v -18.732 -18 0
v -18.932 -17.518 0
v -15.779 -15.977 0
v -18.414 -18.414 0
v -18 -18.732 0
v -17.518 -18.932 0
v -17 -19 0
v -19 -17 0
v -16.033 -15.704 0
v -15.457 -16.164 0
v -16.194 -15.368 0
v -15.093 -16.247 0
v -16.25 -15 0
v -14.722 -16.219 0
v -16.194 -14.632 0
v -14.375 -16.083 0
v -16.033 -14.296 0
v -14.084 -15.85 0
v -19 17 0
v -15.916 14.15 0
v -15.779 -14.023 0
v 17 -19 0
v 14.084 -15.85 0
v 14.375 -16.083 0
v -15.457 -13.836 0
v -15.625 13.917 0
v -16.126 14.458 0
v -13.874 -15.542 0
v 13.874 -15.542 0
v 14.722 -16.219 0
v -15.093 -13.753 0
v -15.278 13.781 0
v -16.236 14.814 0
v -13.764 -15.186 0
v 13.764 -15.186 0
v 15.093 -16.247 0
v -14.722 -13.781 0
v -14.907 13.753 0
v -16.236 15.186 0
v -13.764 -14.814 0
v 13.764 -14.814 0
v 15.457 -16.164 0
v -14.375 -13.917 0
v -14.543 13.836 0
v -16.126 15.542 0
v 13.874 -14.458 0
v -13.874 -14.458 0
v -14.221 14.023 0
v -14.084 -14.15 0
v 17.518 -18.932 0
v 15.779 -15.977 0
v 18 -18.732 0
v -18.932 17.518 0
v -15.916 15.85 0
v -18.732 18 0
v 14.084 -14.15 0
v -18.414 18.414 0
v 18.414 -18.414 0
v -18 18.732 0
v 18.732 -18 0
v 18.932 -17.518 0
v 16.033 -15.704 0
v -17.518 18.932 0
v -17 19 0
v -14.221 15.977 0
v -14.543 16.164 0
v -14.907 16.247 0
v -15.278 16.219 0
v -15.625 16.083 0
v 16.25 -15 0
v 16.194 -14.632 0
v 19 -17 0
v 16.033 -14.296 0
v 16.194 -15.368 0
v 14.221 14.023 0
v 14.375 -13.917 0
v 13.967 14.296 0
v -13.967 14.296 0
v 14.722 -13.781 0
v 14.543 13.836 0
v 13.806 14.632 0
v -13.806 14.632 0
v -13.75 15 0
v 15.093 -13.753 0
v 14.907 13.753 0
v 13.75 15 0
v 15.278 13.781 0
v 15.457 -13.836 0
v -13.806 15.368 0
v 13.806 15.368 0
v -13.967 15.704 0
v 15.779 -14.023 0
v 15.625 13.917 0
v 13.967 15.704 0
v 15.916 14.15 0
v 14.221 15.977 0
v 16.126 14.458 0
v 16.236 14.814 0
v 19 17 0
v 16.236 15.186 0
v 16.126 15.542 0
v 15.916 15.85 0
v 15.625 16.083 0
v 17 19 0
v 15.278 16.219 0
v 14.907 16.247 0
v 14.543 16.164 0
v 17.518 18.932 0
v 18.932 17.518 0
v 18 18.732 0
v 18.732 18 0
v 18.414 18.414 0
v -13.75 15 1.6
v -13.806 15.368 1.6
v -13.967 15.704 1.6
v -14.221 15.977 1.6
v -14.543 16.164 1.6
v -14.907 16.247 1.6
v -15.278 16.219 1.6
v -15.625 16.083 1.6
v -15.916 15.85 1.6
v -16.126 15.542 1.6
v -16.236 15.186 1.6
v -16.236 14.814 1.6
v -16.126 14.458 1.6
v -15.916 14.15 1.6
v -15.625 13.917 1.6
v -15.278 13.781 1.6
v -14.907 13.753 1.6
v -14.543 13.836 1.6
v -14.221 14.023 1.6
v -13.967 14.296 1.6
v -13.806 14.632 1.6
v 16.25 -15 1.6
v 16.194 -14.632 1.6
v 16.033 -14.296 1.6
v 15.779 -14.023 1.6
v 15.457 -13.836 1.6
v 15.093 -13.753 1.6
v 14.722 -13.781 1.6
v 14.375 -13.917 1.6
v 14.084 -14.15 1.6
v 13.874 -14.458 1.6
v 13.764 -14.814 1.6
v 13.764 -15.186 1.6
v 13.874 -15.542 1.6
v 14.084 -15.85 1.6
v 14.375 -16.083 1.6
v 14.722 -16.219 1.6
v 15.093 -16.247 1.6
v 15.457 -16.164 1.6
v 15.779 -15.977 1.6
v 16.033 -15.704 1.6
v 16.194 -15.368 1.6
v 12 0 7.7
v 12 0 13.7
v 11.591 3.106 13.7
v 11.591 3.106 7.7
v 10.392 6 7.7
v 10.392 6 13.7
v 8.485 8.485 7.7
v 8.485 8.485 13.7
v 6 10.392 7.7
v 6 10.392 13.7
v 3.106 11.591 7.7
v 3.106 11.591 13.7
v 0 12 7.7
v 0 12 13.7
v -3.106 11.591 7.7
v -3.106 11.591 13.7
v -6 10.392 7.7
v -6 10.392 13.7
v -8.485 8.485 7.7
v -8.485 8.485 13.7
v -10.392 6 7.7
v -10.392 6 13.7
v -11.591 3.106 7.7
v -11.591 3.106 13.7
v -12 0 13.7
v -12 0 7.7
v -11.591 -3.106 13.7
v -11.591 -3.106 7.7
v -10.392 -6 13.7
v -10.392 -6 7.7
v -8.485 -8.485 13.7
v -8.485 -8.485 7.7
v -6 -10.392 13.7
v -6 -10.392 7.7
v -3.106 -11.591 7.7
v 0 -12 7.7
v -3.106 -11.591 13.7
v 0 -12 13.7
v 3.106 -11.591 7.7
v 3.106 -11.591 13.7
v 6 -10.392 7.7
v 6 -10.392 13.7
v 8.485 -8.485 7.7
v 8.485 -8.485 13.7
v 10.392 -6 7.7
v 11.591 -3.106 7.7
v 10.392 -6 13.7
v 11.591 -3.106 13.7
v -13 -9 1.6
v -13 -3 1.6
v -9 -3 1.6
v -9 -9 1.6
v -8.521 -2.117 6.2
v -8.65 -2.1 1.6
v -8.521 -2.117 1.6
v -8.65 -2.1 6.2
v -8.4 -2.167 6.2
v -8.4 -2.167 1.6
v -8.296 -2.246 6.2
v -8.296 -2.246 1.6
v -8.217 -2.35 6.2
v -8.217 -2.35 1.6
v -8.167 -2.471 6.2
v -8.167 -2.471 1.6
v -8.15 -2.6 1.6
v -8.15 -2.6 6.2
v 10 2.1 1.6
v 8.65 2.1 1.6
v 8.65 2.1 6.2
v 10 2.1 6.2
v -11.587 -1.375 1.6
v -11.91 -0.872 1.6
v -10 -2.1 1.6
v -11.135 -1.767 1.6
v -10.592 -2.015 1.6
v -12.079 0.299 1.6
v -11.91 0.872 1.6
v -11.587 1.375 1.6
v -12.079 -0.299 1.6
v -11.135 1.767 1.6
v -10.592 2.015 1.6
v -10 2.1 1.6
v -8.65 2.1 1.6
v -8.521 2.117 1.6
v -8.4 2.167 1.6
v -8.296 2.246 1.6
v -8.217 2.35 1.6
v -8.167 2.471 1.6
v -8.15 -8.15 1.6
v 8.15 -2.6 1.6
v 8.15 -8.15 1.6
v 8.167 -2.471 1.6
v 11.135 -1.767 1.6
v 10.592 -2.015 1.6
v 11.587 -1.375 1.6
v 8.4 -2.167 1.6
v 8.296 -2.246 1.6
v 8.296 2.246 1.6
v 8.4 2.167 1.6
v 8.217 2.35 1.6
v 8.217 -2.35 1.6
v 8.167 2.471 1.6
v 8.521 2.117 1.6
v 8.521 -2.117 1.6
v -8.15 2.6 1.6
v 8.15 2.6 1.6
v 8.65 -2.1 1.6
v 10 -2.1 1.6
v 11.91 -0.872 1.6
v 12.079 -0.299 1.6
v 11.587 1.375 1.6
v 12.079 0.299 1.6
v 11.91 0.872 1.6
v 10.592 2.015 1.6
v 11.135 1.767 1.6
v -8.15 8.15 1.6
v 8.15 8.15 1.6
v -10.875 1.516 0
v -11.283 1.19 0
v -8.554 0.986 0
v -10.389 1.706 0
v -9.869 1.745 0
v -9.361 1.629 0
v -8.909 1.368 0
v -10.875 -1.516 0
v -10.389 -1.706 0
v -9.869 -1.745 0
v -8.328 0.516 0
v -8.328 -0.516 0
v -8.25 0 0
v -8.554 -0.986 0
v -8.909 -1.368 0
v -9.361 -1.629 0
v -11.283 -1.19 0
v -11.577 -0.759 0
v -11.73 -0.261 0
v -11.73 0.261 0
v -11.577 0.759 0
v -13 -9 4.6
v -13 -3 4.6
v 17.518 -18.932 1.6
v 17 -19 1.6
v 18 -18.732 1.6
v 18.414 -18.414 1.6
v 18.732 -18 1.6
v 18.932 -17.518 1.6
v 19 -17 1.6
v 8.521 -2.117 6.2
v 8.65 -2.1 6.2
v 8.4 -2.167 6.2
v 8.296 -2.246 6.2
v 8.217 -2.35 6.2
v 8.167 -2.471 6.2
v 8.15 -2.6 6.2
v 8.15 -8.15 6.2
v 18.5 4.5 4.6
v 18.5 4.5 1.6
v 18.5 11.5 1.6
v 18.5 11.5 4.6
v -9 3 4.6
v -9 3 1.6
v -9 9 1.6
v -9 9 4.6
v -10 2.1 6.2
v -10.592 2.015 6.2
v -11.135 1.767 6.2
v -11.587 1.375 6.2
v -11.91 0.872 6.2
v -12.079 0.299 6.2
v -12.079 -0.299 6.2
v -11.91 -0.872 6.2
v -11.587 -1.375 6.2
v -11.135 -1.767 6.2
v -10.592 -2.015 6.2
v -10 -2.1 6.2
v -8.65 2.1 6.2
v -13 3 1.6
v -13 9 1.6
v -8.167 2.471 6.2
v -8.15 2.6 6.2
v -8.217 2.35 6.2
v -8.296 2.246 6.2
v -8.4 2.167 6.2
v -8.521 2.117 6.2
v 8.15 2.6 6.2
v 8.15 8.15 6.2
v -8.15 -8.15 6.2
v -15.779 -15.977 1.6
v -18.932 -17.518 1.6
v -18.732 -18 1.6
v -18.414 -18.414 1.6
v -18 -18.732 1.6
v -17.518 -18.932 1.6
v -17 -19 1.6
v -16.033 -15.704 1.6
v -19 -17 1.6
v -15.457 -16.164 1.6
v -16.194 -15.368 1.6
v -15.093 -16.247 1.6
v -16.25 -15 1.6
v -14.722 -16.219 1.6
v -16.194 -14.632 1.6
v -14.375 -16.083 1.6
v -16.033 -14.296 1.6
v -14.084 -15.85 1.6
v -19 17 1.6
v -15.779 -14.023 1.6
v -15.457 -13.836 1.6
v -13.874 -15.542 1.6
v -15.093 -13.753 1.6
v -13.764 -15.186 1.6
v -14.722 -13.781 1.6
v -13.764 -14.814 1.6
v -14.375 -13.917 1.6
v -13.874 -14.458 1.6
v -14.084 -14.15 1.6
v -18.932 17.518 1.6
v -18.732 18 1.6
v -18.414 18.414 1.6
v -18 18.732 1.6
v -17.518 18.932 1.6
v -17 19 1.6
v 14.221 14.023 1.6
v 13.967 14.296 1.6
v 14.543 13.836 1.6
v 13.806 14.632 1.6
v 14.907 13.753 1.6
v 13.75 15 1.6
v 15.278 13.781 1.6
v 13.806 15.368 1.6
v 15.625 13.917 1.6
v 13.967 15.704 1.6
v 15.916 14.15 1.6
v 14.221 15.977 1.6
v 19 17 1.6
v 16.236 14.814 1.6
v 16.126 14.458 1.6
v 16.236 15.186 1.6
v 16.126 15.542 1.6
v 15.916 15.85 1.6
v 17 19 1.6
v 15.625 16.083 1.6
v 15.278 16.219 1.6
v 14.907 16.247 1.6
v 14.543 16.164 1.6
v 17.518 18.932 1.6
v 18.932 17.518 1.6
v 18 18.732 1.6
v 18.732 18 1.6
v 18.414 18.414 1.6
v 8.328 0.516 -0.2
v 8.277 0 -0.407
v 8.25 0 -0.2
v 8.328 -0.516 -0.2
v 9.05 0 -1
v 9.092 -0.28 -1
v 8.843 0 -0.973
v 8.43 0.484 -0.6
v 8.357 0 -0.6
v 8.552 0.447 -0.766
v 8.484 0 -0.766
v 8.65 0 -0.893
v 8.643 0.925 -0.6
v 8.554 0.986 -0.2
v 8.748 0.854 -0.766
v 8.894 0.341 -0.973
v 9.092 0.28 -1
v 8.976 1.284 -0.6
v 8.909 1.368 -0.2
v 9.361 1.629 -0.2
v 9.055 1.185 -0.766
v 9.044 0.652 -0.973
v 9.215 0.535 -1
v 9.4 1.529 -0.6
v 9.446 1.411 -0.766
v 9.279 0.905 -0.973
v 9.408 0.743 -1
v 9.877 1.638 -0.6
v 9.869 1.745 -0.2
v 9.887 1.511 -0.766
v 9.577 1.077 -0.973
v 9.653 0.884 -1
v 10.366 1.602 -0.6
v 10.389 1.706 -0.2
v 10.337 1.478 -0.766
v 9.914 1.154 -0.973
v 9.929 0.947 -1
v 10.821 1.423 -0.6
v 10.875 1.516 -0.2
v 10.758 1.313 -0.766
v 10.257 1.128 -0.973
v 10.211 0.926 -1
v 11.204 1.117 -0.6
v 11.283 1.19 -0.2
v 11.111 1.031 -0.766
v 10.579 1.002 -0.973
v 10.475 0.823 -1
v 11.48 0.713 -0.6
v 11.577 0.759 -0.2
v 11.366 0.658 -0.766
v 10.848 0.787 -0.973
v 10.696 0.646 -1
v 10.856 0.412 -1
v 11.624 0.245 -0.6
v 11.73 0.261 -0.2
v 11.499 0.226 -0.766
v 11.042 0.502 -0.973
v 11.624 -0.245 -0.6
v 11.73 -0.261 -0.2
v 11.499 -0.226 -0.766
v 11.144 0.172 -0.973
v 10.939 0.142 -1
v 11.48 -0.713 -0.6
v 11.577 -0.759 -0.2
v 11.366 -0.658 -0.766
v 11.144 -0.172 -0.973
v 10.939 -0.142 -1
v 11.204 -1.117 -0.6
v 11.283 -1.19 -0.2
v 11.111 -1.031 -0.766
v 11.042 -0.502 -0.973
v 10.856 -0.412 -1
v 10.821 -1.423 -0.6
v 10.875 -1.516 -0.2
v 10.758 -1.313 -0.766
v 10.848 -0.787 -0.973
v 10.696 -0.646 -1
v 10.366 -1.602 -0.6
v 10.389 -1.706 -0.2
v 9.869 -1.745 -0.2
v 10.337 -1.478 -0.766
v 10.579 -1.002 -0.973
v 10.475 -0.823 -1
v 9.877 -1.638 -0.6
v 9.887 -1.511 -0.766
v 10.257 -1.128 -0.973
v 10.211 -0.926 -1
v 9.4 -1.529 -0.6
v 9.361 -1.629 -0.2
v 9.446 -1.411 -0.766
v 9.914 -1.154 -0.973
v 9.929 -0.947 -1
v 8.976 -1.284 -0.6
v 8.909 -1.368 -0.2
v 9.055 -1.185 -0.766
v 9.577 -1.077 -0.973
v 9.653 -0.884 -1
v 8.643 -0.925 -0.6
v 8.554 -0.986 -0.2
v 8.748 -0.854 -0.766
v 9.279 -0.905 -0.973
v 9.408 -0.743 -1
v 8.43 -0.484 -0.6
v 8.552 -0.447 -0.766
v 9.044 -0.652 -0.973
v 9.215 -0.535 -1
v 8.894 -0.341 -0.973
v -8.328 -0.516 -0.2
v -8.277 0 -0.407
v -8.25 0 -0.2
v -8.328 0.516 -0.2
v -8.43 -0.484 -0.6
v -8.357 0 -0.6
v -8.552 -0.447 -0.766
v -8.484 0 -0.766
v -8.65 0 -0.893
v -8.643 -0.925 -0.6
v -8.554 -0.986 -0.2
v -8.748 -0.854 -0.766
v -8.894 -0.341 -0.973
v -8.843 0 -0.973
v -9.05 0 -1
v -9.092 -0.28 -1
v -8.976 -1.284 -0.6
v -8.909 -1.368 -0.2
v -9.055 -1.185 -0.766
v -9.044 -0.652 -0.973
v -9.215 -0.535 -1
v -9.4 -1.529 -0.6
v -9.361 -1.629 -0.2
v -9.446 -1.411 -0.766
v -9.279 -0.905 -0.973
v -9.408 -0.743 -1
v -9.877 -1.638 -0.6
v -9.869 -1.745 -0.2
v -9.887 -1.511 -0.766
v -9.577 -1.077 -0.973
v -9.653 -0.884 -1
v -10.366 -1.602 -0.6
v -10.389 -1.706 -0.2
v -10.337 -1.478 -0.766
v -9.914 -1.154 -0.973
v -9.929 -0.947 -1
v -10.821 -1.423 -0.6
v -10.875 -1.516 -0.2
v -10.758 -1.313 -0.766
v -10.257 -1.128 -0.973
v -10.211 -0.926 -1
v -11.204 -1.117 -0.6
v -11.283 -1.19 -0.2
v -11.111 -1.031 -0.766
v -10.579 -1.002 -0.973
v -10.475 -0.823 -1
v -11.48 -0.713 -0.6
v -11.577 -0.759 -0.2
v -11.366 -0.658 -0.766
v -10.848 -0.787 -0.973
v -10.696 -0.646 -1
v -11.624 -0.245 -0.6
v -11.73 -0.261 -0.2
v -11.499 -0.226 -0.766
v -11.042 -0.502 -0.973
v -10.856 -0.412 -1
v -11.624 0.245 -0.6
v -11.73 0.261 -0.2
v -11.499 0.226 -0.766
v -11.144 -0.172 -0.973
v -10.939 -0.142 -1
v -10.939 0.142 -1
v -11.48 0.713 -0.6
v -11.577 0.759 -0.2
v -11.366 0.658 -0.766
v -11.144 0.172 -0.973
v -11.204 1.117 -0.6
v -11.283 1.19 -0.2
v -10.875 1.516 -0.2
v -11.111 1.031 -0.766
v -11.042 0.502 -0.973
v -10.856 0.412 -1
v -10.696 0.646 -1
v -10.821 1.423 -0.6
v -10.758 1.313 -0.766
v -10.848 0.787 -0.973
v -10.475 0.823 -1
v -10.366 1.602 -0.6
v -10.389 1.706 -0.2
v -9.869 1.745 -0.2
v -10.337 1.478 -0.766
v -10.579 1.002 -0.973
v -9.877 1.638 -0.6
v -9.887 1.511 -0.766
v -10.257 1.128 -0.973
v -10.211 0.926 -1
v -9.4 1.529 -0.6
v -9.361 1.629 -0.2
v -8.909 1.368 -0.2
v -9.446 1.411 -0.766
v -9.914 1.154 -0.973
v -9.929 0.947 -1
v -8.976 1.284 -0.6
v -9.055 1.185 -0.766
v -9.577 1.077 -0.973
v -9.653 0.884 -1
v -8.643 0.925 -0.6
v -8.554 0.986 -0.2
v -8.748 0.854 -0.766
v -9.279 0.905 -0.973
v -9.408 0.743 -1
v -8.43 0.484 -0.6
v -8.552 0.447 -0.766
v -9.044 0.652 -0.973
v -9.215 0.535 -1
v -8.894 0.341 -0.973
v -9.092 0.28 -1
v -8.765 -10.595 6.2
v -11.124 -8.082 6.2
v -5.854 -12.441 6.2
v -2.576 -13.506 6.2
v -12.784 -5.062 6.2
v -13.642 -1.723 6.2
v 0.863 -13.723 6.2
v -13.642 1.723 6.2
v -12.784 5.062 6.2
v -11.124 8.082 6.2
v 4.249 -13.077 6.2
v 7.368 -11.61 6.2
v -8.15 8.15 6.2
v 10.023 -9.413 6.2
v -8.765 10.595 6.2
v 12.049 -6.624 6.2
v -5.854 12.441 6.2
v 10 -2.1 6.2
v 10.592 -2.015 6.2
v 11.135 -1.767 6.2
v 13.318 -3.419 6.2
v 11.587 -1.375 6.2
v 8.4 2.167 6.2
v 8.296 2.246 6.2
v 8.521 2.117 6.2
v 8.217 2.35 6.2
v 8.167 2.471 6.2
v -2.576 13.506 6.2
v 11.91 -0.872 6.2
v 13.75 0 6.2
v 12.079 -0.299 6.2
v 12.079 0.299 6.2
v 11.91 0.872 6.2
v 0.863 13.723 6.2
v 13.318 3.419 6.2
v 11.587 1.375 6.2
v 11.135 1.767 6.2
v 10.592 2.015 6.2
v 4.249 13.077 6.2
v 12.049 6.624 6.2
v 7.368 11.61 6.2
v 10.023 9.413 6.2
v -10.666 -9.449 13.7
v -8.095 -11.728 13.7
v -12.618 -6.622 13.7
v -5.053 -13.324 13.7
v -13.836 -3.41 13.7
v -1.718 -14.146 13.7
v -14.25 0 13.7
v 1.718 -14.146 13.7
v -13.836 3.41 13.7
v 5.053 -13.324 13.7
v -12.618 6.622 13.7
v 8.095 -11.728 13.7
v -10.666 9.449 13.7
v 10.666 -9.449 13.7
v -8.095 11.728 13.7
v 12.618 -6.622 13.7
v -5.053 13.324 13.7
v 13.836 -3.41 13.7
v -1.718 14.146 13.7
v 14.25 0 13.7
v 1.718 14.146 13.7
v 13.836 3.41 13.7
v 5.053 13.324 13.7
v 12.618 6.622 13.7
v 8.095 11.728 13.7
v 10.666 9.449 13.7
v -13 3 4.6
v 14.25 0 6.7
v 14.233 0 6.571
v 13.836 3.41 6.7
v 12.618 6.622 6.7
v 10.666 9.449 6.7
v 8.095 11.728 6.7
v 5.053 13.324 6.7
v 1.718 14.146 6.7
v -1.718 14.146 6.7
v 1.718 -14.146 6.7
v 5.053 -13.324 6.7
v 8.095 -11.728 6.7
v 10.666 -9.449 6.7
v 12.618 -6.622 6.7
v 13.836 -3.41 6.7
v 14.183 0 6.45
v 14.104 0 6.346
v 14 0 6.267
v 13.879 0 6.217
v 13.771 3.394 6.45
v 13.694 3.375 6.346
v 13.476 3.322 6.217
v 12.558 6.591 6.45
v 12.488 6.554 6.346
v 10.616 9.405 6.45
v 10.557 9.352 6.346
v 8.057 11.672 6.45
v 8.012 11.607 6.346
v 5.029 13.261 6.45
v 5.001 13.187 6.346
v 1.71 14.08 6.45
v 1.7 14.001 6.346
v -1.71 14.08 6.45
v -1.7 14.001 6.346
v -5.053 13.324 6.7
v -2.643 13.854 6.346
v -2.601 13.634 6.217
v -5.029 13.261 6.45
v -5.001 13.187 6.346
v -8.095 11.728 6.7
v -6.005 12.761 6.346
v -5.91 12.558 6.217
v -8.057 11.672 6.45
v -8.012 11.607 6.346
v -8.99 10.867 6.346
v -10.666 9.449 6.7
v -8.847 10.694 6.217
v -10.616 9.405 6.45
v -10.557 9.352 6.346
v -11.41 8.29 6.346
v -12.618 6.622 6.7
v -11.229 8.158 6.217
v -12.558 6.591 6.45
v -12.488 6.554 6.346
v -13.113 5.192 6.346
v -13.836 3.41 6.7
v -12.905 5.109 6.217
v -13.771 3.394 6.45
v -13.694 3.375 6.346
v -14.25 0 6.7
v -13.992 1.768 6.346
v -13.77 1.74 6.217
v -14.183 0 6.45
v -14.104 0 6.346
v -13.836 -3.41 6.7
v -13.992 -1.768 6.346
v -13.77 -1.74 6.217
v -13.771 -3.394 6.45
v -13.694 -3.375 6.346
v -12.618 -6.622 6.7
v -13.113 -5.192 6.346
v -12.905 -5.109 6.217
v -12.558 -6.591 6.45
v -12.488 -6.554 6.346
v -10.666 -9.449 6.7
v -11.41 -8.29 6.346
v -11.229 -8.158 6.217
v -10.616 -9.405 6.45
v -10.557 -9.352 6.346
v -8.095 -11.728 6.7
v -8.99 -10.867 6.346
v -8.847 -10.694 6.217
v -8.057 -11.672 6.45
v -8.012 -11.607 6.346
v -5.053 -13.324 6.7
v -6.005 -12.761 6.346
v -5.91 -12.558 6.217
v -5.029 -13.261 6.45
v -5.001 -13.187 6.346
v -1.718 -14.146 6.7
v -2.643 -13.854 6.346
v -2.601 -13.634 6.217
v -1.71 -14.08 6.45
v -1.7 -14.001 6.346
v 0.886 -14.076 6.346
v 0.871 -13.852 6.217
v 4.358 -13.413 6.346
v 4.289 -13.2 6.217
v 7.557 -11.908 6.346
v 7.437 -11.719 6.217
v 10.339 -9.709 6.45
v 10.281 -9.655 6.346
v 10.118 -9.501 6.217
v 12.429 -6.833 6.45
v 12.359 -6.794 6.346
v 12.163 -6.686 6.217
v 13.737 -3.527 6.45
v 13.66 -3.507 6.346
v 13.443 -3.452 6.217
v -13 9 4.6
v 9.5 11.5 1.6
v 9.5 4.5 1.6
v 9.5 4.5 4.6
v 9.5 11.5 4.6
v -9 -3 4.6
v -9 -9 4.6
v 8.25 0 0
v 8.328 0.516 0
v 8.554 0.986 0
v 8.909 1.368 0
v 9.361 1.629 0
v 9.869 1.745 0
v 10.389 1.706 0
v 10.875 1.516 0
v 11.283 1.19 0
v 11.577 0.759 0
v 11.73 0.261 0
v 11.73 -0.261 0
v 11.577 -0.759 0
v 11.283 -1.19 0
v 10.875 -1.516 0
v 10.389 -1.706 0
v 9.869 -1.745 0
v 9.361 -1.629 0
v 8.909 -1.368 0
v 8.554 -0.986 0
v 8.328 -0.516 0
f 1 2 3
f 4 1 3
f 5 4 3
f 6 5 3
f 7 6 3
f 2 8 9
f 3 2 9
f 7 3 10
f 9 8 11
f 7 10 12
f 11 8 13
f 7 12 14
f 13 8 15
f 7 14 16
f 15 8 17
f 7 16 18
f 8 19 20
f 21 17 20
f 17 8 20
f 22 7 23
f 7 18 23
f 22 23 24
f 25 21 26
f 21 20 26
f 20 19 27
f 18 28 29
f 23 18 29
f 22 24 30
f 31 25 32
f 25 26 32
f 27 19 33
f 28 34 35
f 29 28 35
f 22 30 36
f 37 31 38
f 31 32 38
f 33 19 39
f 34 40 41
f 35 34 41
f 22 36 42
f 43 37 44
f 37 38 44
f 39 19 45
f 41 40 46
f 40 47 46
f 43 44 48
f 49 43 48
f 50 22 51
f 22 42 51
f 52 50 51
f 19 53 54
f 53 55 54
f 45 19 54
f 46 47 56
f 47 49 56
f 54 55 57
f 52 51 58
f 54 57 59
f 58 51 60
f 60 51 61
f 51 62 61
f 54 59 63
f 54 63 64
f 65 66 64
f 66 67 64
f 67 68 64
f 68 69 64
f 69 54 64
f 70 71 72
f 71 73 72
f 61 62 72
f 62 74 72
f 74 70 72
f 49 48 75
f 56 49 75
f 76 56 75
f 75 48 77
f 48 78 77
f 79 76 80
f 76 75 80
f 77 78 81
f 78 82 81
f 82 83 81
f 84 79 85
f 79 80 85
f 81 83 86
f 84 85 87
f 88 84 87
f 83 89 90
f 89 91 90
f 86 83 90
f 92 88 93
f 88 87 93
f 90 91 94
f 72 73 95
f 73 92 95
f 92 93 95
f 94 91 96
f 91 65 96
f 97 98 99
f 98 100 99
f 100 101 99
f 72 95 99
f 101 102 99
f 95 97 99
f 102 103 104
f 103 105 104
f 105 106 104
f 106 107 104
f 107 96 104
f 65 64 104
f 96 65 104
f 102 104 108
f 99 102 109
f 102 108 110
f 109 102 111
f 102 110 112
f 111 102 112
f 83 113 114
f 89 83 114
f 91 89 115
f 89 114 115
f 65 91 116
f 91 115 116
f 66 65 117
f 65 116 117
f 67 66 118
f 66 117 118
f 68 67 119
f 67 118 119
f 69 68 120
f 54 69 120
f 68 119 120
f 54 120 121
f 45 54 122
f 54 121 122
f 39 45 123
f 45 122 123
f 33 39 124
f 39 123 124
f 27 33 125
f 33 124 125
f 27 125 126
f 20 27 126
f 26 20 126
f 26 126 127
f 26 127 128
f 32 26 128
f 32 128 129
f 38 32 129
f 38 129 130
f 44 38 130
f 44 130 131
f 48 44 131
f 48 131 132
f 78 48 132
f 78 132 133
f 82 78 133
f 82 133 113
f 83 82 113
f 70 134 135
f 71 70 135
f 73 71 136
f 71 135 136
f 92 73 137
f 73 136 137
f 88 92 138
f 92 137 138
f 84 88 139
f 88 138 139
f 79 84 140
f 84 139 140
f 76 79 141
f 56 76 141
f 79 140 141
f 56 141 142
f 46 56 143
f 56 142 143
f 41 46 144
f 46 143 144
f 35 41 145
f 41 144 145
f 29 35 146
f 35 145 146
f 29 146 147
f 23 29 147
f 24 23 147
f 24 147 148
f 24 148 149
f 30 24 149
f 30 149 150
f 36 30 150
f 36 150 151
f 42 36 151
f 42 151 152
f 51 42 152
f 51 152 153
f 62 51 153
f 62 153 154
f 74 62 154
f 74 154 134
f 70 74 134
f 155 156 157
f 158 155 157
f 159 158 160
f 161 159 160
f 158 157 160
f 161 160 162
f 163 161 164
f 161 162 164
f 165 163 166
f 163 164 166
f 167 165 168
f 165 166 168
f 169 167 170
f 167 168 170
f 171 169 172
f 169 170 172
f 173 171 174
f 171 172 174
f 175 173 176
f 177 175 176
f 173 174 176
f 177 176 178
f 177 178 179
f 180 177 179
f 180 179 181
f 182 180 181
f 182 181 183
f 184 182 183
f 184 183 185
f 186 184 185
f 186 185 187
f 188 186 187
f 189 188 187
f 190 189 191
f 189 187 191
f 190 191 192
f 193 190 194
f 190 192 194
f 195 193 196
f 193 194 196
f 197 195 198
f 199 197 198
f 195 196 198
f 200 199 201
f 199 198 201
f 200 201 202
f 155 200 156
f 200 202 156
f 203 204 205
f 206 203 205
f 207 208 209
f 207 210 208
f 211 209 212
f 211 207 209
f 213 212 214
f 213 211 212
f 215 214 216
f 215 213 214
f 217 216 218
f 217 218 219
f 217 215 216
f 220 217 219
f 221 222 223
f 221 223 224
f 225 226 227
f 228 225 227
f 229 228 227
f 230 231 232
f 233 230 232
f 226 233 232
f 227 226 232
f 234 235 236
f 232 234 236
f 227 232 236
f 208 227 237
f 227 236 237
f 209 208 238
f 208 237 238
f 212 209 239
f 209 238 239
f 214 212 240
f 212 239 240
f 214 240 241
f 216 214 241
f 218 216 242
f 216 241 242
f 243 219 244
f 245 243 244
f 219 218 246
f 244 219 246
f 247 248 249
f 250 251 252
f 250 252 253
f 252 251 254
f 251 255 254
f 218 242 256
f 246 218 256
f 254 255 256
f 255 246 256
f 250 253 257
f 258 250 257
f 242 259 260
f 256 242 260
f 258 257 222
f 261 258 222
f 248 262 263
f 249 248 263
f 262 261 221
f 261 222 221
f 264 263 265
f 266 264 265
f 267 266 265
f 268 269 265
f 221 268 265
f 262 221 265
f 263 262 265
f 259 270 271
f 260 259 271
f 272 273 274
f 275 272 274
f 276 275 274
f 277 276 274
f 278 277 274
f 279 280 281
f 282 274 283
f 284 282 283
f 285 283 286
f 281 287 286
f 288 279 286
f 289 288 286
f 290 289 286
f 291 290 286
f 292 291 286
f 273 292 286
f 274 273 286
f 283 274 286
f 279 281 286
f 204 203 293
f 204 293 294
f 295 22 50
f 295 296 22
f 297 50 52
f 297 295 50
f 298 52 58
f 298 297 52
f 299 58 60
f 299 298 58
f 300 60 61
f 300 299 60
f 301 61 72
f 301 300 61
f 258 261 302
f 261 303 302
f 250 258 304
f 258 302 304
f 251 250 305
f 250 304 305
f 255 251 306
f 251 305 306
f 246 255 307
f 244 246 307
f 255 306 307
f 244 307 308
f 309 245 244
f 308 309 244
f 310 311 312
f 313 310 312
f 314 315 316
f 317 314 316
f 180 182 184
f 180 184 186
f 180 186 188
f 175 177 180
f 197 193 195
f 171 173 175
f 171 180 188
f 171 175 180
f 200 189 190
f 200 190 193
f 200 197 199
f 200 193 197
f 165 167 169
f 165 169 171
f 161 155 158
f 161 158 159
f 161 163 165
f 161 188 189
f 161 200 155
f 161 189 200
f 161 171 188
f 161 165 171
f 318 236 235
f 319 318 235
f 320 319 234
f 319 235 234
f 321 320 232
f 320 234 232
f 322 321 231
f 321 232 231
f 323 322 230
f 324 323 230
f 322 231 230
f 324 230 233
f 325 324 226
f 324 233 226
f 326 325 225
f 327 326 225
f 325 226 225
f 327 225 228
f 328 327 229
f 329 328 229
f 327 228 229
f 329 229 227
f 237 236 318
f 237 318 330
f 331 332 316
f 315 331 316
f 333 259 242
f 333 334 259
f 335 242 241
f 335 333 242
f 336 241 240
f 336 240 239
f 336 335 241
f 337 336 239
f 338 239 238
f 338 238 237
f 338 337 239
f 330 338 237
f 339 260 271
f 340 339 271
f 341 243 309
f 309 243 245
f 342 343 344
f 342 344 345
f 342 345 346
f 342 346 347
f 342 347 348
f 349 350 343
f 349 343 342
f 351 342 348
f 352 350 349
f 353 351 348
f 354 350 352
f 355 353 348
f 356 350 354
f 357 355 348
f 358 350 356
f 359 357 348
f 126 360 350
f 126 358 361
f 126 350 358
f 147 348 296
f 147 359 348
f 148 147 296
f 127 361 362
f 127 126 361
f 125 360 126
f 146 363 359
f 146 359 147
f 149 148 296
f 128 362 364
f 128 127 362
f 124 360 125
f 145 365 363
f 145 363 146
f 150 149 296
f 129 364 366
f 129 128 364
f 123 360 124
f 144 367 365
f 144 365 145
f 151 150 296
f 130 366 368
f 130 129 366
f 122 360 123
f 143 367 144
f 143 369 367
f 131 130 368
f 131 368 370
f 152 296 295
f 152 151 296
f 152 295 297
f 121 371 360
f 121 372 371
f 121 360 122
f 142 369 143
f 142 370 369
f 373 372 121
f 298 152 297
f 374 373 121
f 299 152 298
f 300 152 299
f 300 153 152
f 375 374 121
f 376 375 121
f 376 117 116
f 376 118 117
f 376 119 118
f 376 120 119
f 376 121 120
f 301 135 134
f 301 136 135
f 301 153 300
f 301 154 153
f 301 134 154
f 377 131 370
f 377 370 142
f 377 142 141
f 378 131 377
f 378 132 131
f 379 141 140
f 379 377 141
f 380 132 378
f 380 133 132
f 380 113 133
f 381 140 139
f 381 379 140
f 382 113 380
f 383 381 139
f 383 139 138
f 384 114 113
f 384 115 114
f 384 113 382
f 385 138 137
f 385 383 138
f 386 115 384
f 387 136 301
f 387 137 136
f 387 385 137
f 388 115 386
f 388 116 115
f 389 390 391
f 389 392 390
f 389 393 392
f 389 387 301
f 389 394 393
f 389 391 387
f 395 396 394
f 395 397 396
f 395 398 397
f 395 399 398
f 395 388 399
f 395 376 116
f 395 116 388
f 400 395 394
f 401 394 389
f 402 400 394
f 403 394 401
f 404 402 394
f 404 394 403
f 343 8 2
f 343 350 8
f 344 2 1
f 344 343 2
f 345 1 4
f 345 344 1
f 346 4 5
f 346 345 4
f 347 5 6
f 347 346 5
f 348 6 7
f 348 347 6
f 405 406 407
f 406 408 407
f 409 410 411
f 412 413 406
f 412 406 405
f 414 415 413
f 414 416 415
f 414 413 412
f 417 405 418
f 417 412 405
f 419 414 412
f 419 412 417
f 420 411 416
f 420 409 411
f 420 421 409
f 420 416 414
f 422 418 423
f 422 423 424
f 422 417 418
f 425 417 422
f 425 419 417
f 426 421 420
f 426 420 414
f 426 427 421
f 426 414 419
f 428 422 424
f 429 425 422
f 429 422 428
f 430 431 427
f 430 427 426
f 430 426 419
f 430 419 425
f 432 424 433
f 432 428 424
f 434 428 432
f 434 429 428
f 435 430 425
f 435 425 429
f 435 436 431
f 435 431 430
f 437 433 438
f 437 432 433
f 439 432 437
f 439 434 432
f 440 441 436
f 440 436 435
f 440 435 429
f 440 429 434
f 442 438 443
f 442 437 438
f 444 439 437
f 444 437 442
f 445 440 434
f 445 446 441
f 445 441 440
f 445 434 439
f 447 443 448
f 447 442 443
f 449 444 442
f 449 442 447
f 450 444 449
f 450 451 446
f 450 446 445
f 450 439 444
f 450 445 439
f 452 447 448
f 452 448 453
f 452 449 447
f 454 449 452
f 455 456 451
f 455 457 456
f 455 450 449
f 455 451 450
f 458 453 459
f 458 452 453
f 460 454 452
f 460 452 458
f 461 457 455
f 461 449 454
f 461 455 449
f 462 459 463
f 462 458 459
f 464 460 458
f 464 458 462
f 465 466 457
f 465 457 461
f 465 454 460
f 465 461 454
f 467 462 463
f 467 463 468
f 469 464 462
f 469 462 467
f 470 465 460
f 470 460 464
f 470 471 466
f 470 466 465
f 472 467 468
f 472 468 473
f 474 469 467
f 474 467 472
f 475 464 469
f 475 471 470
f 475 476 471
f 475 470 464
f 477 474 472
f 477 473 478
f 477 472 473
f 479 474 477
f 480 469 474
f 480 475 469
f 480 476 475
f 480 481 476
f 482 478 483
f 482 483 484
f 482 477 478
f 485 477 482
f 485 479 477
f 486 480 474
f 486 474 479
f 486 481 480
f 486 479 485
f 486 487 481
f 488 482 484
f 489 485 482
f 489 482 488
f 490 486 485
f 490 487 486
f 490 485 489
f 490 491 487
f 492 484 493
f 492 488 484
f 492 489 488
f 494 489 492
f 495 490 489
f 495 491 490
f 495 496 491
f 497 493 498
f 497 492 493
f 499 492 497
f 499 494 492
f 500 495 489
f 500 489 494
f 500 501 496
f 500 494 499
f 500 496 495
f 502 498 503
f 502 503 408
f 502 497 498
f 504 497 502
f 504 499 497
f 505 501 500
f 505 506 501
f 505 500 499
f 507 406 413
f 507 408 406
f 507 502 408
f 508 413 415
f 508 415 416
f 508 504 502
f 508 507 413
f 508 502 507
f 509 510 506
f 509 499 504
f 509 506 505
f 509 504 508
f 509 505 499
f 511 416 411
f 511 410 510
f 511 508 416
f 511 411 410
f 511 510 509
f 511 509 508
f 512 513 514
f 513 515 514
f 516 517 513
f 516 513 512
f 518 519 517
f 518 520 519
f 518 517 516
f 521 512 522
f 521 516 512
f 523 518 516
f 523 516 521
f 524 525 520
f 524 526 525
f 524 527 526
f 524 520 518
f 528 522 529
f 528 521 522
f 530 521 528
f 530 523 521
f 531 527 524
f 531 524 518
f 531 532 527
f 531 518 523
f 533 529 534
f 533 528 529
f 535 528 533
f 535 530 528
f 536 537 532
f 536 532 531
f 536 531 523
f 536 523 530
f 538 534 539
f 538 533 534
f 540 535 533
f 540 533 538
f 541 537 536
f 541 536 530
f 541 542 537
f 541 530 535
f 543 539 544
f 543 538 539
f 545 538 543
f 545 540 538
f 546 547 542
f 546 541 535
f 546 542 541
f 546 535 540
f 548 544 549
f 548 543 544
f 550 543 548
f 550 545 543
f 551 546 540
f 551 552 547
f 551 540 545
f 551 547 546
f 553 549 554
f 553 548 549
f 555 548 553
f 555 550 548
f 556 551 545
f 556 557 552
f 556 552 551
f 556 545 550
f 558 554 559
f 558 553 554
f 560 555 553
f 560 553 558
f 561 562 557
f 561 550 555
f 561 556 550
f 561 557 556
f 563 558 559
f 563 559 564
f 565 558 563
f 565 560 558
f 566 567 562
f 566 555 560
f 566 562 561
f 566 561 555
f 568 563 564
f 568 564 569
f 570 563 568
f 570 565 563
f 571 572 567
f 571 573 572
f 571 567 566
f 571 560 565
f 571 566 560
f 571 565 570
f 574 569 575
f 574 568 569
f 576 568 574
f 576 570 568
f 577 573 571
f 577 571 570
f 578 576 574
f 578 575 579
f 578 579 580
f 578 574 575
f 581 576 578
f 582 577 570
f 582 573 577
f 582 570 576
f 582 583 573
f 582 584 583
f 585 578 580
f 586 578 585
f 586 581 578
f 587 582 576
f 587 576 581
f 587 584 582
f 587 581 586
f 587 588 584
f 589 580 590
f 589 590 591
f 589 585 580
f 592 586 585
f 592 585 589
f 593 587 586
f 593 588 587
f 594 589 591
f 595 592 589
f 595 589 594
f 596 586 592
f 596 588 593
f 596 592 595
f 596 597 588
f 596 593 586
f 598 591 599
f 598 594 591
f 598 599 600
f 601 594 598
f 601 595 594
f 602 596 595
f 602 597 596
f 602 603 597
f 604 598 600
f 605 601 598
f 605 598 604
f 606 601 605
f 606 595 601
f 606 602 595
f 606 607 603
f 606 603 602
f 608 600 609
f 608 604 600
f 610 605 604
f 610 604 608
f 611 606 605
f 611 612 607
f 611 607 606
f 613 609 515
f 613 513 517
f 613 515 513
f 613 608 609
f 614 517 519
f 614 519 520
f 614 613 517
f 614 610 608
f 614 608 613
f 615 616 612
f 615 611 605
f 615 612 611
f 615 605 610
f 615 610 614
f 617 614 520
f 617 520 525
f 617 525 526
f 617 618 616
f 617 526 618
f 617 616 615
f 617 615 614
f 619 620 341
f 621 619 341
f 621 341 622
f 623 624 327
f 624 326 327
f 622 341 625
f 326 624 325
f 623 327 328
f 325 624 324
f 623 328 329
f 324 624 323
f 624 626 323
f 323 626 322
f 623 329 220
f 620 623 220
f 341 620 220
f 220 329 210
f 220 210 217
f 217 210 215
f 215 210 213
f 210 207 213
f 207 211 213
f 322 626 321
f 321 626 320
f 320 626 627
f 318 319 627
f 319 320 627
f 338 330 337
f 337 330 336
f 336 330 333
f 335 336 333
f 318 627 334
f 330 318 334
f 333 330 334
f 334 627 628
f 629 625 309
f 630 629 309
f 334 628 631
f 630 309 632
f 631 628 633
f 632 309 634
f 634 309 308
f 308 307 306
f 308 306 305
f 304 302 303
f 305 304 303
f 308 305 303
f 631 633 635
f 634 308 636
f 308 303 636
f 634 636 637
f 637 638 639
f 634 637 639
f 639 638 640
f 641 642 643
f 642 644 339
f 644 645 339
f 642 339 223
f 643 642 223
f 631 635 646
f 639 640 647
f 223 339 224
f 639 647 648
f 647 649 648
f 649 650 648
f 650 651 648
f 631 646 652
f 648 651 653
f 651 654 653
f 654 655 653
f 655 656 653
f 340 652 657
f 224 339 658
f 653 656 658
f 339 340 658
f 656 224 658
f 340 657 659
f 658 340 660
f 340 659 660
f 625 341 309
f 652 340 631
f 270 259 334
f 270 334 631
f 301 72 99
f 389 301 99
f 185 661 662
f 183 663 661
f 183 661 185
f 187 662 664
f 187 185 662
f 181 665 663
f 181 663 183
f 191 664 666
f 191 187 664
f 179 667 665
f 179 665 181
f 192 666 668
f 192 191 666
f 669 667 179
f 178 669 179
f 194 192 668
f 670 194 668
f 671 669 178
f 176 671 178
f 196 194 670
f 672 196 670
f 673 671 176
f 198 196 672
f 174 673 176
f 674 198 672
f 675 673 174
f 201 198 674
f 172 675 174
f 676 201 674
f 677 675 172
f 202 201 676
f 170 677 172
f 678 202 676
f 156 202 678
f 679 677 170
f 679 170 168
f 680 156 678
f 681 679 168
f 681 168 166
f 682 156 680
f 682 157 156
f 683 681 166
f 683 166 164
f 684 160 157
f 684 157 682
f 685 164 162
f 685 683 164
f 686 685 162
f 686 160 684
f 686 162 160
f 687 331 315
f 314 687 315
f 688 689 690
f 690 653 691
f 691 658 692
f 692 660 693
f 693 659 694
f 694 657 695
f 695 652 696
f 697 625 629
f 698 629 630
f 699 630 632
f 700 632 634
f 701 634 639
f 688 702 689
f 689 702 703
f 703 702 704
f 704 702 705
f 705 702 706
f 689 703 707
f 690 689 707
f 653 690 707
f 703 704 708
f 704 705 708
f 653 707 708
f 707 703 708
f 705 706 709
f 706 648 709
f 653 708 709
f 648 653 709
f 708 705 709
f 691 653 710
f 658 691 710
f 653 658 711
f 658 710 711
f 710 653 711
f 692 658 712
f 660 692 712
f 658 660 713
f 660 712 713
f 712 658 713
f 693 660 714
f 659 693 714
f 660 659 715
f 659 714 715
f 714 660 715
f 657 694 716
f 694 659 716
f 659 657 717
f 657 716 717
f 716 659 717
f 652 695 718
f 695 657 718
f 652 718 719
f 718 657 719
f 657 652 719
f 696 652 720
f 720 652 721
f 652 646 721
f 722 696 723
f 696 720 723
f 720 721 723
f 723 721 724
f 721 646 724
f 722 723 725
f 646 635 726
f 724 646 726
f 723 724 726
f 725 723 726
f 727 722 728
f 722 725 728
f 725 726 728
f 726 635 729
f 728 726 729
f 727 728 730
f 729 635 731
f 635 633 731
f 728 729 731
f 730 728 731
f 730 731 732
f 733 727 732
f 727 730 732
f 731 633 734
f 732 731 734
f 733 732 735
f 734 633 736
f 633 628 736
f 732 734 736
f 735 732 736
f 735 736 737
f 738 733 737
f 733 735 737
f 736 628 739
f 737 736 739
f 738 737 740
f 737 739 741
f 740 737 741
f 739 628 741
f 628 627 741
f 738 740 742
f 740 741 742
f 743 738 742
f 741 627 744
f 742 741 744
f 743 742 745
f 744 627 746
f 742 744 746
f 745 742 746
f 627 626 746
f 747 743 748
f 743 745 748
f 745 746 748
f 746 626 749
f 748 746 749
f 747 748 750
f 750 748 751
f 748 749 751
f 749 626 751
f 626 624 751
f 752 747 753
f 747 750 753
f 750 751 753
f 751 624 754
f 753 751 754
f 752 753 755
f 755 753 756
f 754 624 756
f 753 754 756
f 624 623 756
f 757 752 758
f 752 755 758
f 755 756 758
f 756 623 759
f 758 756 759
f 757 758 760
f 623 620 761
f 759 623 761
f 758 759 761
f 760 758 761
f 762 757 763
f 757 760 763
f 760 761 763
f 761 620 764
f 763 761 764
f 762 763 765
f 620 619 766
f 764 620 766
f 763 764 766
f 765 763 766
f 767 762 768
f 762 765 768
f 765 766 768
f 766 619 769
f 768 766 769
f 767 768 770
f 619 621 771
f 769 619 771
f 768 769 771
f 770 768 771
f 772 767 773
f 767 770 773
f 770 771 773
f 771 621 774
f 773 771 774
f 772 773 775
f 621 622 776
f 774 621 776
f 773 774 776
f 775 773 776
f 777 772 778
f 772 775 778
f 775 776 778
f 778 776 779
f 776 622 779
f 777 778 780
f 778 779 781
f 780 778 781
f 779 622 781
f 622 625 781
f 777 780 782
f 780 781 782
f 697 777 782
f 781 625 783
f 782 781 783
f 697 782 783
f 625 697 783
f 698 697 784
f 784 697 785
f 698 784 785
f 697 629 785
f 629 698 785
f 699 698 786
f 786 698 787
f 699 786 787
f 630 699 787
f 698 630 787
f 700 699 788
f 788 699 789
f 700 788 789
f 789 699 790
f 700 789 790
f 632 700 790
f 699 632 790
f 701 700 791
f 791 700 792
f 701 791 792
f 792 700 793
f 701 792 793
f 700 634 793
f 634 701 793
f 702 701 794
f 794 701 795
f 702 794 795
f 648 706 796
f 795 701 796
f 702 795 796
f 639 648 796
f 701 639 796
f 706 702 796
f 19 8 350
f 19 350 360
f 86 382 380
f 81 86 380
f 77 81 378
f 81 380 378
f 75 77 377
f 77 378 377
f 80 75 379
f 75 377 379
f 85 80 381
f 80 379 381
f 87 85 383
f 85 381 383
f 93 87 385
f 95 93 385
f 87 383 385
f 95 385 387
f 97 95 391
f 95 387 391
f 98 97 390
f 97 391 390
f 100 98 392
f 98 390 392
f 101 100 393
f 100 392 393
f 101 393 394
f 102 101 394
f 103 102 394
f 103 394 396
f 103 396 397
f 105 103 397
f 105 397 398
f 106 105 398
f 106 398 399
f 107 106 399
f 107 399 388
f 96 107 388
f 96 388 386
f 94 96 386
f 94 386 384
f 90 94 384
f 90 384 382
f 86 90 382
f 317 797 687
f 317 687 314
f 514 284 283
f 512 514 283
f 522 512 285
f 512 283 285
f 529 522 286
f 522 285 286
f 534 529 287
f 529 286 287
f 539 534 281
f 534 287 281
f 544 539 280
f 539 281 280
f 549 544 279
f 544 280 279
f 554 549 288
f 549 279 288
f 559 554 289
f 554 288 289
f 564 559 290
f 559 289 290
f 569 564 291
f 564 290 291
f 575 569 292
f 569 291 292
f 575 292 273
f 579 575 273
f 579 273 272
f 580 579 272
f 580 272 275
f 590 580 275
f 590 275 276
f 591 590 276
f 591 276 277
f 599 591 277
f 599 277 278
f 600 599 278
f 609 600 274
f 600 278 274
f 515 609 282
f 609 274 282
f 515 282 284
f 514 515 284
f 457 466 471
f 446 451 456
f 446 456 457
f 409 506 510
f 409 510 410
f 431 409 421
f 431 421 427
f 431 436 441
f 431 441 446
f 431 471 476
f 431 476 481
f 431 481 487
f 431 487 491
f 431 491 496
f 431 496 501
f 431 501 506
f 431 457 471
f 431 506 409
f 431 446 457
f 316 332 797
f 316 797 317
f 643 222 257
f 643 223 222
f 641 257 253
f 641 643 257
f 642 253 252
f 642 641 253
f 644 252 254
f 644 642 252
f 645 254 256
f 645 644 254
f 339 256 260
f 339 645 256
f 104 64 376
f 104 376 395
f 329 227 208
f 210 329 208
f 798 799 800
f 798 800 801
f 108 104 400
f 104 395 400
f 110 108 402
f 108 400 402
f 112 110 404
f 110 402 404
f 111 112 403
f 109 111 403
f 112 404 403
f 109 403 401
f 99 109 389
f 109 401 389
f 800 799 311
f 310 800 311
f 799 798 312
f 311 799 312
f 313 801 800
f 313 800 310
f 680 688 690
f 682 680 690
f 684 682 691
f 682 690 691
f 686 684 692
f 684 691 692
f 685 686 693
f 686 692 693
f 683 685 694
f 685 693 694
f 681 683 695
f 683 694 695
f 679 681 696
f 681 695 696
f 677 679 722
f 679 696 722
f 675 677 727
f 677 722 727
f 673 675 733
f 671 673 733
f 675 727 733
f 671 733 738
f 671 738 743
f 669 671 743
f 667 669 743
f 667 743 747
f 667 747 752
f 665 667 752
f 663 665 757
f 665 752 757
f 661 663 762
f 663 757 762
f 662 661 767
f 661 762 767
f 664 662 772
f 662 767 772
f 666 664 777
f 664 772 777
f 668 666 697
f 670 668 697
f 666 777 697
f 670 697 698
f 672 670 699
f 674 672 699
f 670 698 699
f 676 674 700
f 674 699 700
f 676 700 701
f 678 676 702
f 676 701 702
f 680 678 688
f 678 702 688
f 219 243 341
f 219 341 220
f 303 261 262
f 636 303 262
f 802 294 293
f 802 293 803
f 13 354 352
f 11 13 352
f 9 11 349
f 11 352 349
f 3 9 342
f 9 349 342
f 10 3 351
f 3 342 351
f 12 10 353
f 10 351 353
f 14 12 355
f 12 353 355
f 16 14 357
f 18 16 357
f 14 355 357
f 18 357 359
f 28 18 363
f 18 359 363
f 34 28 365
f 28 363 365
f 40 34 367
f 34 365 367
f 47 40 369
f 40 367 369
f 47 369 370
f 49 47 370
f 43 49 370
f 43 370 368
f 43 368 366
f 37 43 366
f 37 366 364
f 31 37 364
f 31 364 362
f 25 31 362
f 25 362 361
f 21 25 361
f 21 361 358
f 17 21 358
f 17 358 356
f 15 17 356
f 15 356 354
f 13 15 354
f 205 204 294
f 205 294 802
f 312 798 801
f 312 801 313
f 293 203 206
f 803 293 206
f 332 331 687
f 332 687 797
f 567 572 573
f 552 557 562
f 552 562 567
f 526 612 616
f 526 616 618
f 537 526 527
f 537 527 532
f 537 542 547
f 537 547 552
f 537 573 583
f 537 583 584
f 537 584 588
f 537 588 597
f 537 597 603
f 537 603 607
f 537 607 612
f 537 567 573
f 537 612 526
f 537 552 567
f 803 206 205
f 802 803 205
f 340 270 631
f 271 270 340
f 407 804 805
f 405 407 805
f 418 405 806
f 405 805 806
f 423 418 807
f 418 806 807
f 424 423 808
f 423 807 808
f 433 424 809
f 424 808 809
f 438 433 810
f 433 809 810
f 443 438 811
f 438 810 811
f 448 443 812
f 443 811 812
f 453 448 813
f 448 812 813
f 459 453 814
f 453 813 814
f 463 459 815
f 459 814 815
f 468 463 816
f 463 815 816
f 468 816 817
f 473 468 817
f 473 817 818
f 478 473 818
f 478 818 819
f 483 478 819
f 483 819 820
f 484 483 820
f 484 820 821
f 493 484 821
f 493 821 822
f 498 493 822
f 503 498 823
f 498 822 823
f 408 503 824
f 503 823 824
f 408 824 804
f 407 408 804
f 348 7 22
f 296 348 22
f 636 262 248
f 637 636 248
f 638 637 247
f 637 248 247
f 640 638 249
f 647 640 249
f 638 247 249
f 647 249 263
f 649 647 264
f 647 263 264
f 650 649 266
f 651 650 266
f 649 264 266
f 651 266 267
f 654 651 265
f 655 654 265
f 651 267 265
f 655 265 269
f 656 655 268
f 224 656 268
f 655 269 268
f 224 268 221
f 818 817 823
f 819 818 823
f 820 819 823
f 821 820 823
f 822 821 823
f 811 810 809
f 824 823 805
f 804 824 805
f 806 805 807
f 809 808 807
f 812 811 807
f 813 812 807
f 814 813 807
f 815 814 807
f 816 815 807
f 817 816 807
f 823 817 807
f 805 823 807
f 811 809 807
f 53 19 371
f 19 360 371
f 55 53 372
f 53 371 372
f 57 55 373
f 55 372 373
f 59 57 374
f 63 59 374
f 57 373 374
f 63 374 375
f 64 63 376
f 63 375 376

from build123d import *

# Parameters (mm, degrees)
SKETCH1_W             = 38
SKETCH1_H             = 38
BOSS_EXTRUDE1_DEPTH   = 1.6
SKETCH2_R             = 1.25
CUT_EXTRUDE1_DEPTH    = 27.917652201
FILLET1_R             = 2
SKETCH3_R             = 2.1
SKETCH3_W             = 16.3
SKETCH3_H             = 16.3
SKETCH3_W_2           = 20
SKETCH3_H_2           = 4.2
BOSS_EXTRUDE2_DEPTH   = 4.6
SKETCH4_R             = 14.25
BOSS_EXTRUDE3_DEPTH   = 7.5
SKETCH5_R             = 12
CUT_EXTRUDE2_DEPTH    = 6
FILLET2_R             = 0.5
SKETCH6_R             = 1.75
BOSS_EXTRUDE4_DEPTH   = 1
BOSS_EXTRUDE4_2_DEPTH = 1
FILLET3_R             = 0.8
FILLET4_R             = 0.8
SKETCH8_W             = 9
SKETCH8_H             = 7
BOSS_EXTRUDE5_DEPTH   = 3
SKETCH8_W_2           = 4
SKETCH8_H_2           = 6
BOSS_EXTRUDE5_2_DEPTH = 3
BOSS_EXTRUDE5_3_DEPTH = 3


with BuildPart() as part:
    # Sketch1 → Boss-Extrude1 (new body)
    with BuildSketch(Plane.XY):
        Rectangle(SKETCH1_W, SKETCH1_H)
    extrude(amount=BOSS_EXTRUDE1_DEPTH)

    # Sketch2 → Cut-Extrude1 (cut, through all)
    with BuildSketch(Plane.XY.offset(1.6)):
        with Locations((-15, 15)):
            Circle(SKETCH2_R)
        with Locations(Location((15, 15, 0), (0, 0, 180))):
            Circle(SKETCH2_R)
        with Locations((15, -15)):
            Circle(SKETCH2_R)
        with Locations(Location((-15, -15, 0), (0, 0, 180))):
            Circle(SKETCH2_R)
    extrude(amount=-CUT_EXTRUDE1_DEPTH, mode=Mode.SUBTRACT)

    # Fillet1
    fillet1_edges = [part.edges().sort_by_distance(p)[0] for p in [
        (19, -19, 0.8),
        (-19, -19, 0.8),
        (-19, 19, 0.8),
        (19, 19, 0.8),
    ]]
    fillet(fillet1_edges, radius=FILLET1_R)


with BuildPart() as body_2:
    # Sketch3 → Boss-Extrude2 (new body)
    with BuildSketch(Plane.XY.offset(1.6)):
        with Locations((10, 0)):
            Circle(SKETCH3_R)
        with Locations((-10, 0)):
            Circle(SKETCH3_R)
        Rectangle(SKETCH3_W, SKETCH3_H)
        Rectangle(SKETCH3_W_2, SKETCH3_H_2)
    extrude(amount=BOSS_EXTRUDE2_DEPTH)

    # Sketch4 → Boss-Extrude3 (add)
    with BuildSketch(Plane.XY.offset(6.2)):
        Circle(SKETCH4_R)
    extrude(amount=BOSS_EXTRUDE3_DEPTH)

    # Sketch5 → Cut-Extrude2 (cut)
    with BuildSketch(Plane.XY.offset(13.7)):
        Circle(SKETCH5_R)
    extrude(amount=-CUT_EXTRUDE2_DEPTH, mode=Mode.SUBTRACT)

    # Fillet2
    fillet2_edges = [body_2.edges().sort_by_distance(p)[0] for p in [
        (8.15, 2.1, 3.9),
        (8.15, -2.1, 3.9),
        (-8.15, 2.1, 3.9),
        (-8.15, -2.1, 3.9),
        (-14.25, 0, 6.2),
    ]]
    fillet(fillet2_edges, radius=FILLET2_R)


with BuildPart() as body_3:
    # Sketch6 → Boss-Extrude4 (new body)
    with BuildSketch(Plane(origin=(0, 0, 0), x_dir=(-1, 0, 0), z_dir=(0, 0, -1))):
        with Locations((-10, 0)):
            Circle(SKETCH6_R)
    extrude(amount=BOSS_EXTRUDE4_DEPTH)

    # Fillet3
    fillet3_edges = [body_3.edges().sort_by_distance(p)[0] for p in [
        (11.75, 0, -1),
    ]]
    fillet(fillet3_edges, radius=FILLET3_R)


with BuildPart() as body_4:
    # Sketch6 → Boss-Extrude4 2 (new body)
    with BuildSketch(Plane(origin=(0, 0, 0), x_dir=(-1, 0, 0), z_dir=(0, 0, -1))):
        with Locations(Location((10, 0, 0), (0, 0, 180))):
            Circle(SKETCH6_R)
    extrude(amount=BOSS_EXTRUDE4_2_DEPTH)

    # Fillet4
    fillet4_edges = [body_4.edges().sort_by_distance(p)[0] for p in [
        (-11.75, 0, -1),
    ]]
    fillet(fillet4_edges, radius=FILLET4_R)


with BuildPart() as body_5:
    # Sketch8 → Boss-Extrude5 (new body)
    with BuildSketch(Plane.XY.offset(1.6)):
        with Locations((14, 8)):
            Rectangle(SKETCH8_W, SKETCH8_H)
    extrude(amount=BOSS_EXTRUDE5_DEPTH)


with BuildPart() as body_6:
    # Sketch8 → Boss-Extrude5 2 (new body)
    with BuildSketch(Plane.XY.offset(1.6)):
        with Locations((-11, 6)):
            Rectangle(SKETCH8_W_2, SKETCH8_H_2)
    extrude(amount=BOSS_EXTRUDE5_2_DEPTH)


with BuildPart() as body_7:
    # Sketch8 → Boss-Extrude5 3 (new body)
    with BuildSketch(Plane.XY.offset(1.6)):
        with Locations((-11, -6)):
            Rectangle(SKETCH8_W_2, SKETCH8_H_2)
    extrude(amount=BOSS_EXTRUDE5_3_DEPTH)


solid = Compound([part.part, body_2.part, body_3.part, body_4.part, body_5.part, body_6.part, body_7.part])
